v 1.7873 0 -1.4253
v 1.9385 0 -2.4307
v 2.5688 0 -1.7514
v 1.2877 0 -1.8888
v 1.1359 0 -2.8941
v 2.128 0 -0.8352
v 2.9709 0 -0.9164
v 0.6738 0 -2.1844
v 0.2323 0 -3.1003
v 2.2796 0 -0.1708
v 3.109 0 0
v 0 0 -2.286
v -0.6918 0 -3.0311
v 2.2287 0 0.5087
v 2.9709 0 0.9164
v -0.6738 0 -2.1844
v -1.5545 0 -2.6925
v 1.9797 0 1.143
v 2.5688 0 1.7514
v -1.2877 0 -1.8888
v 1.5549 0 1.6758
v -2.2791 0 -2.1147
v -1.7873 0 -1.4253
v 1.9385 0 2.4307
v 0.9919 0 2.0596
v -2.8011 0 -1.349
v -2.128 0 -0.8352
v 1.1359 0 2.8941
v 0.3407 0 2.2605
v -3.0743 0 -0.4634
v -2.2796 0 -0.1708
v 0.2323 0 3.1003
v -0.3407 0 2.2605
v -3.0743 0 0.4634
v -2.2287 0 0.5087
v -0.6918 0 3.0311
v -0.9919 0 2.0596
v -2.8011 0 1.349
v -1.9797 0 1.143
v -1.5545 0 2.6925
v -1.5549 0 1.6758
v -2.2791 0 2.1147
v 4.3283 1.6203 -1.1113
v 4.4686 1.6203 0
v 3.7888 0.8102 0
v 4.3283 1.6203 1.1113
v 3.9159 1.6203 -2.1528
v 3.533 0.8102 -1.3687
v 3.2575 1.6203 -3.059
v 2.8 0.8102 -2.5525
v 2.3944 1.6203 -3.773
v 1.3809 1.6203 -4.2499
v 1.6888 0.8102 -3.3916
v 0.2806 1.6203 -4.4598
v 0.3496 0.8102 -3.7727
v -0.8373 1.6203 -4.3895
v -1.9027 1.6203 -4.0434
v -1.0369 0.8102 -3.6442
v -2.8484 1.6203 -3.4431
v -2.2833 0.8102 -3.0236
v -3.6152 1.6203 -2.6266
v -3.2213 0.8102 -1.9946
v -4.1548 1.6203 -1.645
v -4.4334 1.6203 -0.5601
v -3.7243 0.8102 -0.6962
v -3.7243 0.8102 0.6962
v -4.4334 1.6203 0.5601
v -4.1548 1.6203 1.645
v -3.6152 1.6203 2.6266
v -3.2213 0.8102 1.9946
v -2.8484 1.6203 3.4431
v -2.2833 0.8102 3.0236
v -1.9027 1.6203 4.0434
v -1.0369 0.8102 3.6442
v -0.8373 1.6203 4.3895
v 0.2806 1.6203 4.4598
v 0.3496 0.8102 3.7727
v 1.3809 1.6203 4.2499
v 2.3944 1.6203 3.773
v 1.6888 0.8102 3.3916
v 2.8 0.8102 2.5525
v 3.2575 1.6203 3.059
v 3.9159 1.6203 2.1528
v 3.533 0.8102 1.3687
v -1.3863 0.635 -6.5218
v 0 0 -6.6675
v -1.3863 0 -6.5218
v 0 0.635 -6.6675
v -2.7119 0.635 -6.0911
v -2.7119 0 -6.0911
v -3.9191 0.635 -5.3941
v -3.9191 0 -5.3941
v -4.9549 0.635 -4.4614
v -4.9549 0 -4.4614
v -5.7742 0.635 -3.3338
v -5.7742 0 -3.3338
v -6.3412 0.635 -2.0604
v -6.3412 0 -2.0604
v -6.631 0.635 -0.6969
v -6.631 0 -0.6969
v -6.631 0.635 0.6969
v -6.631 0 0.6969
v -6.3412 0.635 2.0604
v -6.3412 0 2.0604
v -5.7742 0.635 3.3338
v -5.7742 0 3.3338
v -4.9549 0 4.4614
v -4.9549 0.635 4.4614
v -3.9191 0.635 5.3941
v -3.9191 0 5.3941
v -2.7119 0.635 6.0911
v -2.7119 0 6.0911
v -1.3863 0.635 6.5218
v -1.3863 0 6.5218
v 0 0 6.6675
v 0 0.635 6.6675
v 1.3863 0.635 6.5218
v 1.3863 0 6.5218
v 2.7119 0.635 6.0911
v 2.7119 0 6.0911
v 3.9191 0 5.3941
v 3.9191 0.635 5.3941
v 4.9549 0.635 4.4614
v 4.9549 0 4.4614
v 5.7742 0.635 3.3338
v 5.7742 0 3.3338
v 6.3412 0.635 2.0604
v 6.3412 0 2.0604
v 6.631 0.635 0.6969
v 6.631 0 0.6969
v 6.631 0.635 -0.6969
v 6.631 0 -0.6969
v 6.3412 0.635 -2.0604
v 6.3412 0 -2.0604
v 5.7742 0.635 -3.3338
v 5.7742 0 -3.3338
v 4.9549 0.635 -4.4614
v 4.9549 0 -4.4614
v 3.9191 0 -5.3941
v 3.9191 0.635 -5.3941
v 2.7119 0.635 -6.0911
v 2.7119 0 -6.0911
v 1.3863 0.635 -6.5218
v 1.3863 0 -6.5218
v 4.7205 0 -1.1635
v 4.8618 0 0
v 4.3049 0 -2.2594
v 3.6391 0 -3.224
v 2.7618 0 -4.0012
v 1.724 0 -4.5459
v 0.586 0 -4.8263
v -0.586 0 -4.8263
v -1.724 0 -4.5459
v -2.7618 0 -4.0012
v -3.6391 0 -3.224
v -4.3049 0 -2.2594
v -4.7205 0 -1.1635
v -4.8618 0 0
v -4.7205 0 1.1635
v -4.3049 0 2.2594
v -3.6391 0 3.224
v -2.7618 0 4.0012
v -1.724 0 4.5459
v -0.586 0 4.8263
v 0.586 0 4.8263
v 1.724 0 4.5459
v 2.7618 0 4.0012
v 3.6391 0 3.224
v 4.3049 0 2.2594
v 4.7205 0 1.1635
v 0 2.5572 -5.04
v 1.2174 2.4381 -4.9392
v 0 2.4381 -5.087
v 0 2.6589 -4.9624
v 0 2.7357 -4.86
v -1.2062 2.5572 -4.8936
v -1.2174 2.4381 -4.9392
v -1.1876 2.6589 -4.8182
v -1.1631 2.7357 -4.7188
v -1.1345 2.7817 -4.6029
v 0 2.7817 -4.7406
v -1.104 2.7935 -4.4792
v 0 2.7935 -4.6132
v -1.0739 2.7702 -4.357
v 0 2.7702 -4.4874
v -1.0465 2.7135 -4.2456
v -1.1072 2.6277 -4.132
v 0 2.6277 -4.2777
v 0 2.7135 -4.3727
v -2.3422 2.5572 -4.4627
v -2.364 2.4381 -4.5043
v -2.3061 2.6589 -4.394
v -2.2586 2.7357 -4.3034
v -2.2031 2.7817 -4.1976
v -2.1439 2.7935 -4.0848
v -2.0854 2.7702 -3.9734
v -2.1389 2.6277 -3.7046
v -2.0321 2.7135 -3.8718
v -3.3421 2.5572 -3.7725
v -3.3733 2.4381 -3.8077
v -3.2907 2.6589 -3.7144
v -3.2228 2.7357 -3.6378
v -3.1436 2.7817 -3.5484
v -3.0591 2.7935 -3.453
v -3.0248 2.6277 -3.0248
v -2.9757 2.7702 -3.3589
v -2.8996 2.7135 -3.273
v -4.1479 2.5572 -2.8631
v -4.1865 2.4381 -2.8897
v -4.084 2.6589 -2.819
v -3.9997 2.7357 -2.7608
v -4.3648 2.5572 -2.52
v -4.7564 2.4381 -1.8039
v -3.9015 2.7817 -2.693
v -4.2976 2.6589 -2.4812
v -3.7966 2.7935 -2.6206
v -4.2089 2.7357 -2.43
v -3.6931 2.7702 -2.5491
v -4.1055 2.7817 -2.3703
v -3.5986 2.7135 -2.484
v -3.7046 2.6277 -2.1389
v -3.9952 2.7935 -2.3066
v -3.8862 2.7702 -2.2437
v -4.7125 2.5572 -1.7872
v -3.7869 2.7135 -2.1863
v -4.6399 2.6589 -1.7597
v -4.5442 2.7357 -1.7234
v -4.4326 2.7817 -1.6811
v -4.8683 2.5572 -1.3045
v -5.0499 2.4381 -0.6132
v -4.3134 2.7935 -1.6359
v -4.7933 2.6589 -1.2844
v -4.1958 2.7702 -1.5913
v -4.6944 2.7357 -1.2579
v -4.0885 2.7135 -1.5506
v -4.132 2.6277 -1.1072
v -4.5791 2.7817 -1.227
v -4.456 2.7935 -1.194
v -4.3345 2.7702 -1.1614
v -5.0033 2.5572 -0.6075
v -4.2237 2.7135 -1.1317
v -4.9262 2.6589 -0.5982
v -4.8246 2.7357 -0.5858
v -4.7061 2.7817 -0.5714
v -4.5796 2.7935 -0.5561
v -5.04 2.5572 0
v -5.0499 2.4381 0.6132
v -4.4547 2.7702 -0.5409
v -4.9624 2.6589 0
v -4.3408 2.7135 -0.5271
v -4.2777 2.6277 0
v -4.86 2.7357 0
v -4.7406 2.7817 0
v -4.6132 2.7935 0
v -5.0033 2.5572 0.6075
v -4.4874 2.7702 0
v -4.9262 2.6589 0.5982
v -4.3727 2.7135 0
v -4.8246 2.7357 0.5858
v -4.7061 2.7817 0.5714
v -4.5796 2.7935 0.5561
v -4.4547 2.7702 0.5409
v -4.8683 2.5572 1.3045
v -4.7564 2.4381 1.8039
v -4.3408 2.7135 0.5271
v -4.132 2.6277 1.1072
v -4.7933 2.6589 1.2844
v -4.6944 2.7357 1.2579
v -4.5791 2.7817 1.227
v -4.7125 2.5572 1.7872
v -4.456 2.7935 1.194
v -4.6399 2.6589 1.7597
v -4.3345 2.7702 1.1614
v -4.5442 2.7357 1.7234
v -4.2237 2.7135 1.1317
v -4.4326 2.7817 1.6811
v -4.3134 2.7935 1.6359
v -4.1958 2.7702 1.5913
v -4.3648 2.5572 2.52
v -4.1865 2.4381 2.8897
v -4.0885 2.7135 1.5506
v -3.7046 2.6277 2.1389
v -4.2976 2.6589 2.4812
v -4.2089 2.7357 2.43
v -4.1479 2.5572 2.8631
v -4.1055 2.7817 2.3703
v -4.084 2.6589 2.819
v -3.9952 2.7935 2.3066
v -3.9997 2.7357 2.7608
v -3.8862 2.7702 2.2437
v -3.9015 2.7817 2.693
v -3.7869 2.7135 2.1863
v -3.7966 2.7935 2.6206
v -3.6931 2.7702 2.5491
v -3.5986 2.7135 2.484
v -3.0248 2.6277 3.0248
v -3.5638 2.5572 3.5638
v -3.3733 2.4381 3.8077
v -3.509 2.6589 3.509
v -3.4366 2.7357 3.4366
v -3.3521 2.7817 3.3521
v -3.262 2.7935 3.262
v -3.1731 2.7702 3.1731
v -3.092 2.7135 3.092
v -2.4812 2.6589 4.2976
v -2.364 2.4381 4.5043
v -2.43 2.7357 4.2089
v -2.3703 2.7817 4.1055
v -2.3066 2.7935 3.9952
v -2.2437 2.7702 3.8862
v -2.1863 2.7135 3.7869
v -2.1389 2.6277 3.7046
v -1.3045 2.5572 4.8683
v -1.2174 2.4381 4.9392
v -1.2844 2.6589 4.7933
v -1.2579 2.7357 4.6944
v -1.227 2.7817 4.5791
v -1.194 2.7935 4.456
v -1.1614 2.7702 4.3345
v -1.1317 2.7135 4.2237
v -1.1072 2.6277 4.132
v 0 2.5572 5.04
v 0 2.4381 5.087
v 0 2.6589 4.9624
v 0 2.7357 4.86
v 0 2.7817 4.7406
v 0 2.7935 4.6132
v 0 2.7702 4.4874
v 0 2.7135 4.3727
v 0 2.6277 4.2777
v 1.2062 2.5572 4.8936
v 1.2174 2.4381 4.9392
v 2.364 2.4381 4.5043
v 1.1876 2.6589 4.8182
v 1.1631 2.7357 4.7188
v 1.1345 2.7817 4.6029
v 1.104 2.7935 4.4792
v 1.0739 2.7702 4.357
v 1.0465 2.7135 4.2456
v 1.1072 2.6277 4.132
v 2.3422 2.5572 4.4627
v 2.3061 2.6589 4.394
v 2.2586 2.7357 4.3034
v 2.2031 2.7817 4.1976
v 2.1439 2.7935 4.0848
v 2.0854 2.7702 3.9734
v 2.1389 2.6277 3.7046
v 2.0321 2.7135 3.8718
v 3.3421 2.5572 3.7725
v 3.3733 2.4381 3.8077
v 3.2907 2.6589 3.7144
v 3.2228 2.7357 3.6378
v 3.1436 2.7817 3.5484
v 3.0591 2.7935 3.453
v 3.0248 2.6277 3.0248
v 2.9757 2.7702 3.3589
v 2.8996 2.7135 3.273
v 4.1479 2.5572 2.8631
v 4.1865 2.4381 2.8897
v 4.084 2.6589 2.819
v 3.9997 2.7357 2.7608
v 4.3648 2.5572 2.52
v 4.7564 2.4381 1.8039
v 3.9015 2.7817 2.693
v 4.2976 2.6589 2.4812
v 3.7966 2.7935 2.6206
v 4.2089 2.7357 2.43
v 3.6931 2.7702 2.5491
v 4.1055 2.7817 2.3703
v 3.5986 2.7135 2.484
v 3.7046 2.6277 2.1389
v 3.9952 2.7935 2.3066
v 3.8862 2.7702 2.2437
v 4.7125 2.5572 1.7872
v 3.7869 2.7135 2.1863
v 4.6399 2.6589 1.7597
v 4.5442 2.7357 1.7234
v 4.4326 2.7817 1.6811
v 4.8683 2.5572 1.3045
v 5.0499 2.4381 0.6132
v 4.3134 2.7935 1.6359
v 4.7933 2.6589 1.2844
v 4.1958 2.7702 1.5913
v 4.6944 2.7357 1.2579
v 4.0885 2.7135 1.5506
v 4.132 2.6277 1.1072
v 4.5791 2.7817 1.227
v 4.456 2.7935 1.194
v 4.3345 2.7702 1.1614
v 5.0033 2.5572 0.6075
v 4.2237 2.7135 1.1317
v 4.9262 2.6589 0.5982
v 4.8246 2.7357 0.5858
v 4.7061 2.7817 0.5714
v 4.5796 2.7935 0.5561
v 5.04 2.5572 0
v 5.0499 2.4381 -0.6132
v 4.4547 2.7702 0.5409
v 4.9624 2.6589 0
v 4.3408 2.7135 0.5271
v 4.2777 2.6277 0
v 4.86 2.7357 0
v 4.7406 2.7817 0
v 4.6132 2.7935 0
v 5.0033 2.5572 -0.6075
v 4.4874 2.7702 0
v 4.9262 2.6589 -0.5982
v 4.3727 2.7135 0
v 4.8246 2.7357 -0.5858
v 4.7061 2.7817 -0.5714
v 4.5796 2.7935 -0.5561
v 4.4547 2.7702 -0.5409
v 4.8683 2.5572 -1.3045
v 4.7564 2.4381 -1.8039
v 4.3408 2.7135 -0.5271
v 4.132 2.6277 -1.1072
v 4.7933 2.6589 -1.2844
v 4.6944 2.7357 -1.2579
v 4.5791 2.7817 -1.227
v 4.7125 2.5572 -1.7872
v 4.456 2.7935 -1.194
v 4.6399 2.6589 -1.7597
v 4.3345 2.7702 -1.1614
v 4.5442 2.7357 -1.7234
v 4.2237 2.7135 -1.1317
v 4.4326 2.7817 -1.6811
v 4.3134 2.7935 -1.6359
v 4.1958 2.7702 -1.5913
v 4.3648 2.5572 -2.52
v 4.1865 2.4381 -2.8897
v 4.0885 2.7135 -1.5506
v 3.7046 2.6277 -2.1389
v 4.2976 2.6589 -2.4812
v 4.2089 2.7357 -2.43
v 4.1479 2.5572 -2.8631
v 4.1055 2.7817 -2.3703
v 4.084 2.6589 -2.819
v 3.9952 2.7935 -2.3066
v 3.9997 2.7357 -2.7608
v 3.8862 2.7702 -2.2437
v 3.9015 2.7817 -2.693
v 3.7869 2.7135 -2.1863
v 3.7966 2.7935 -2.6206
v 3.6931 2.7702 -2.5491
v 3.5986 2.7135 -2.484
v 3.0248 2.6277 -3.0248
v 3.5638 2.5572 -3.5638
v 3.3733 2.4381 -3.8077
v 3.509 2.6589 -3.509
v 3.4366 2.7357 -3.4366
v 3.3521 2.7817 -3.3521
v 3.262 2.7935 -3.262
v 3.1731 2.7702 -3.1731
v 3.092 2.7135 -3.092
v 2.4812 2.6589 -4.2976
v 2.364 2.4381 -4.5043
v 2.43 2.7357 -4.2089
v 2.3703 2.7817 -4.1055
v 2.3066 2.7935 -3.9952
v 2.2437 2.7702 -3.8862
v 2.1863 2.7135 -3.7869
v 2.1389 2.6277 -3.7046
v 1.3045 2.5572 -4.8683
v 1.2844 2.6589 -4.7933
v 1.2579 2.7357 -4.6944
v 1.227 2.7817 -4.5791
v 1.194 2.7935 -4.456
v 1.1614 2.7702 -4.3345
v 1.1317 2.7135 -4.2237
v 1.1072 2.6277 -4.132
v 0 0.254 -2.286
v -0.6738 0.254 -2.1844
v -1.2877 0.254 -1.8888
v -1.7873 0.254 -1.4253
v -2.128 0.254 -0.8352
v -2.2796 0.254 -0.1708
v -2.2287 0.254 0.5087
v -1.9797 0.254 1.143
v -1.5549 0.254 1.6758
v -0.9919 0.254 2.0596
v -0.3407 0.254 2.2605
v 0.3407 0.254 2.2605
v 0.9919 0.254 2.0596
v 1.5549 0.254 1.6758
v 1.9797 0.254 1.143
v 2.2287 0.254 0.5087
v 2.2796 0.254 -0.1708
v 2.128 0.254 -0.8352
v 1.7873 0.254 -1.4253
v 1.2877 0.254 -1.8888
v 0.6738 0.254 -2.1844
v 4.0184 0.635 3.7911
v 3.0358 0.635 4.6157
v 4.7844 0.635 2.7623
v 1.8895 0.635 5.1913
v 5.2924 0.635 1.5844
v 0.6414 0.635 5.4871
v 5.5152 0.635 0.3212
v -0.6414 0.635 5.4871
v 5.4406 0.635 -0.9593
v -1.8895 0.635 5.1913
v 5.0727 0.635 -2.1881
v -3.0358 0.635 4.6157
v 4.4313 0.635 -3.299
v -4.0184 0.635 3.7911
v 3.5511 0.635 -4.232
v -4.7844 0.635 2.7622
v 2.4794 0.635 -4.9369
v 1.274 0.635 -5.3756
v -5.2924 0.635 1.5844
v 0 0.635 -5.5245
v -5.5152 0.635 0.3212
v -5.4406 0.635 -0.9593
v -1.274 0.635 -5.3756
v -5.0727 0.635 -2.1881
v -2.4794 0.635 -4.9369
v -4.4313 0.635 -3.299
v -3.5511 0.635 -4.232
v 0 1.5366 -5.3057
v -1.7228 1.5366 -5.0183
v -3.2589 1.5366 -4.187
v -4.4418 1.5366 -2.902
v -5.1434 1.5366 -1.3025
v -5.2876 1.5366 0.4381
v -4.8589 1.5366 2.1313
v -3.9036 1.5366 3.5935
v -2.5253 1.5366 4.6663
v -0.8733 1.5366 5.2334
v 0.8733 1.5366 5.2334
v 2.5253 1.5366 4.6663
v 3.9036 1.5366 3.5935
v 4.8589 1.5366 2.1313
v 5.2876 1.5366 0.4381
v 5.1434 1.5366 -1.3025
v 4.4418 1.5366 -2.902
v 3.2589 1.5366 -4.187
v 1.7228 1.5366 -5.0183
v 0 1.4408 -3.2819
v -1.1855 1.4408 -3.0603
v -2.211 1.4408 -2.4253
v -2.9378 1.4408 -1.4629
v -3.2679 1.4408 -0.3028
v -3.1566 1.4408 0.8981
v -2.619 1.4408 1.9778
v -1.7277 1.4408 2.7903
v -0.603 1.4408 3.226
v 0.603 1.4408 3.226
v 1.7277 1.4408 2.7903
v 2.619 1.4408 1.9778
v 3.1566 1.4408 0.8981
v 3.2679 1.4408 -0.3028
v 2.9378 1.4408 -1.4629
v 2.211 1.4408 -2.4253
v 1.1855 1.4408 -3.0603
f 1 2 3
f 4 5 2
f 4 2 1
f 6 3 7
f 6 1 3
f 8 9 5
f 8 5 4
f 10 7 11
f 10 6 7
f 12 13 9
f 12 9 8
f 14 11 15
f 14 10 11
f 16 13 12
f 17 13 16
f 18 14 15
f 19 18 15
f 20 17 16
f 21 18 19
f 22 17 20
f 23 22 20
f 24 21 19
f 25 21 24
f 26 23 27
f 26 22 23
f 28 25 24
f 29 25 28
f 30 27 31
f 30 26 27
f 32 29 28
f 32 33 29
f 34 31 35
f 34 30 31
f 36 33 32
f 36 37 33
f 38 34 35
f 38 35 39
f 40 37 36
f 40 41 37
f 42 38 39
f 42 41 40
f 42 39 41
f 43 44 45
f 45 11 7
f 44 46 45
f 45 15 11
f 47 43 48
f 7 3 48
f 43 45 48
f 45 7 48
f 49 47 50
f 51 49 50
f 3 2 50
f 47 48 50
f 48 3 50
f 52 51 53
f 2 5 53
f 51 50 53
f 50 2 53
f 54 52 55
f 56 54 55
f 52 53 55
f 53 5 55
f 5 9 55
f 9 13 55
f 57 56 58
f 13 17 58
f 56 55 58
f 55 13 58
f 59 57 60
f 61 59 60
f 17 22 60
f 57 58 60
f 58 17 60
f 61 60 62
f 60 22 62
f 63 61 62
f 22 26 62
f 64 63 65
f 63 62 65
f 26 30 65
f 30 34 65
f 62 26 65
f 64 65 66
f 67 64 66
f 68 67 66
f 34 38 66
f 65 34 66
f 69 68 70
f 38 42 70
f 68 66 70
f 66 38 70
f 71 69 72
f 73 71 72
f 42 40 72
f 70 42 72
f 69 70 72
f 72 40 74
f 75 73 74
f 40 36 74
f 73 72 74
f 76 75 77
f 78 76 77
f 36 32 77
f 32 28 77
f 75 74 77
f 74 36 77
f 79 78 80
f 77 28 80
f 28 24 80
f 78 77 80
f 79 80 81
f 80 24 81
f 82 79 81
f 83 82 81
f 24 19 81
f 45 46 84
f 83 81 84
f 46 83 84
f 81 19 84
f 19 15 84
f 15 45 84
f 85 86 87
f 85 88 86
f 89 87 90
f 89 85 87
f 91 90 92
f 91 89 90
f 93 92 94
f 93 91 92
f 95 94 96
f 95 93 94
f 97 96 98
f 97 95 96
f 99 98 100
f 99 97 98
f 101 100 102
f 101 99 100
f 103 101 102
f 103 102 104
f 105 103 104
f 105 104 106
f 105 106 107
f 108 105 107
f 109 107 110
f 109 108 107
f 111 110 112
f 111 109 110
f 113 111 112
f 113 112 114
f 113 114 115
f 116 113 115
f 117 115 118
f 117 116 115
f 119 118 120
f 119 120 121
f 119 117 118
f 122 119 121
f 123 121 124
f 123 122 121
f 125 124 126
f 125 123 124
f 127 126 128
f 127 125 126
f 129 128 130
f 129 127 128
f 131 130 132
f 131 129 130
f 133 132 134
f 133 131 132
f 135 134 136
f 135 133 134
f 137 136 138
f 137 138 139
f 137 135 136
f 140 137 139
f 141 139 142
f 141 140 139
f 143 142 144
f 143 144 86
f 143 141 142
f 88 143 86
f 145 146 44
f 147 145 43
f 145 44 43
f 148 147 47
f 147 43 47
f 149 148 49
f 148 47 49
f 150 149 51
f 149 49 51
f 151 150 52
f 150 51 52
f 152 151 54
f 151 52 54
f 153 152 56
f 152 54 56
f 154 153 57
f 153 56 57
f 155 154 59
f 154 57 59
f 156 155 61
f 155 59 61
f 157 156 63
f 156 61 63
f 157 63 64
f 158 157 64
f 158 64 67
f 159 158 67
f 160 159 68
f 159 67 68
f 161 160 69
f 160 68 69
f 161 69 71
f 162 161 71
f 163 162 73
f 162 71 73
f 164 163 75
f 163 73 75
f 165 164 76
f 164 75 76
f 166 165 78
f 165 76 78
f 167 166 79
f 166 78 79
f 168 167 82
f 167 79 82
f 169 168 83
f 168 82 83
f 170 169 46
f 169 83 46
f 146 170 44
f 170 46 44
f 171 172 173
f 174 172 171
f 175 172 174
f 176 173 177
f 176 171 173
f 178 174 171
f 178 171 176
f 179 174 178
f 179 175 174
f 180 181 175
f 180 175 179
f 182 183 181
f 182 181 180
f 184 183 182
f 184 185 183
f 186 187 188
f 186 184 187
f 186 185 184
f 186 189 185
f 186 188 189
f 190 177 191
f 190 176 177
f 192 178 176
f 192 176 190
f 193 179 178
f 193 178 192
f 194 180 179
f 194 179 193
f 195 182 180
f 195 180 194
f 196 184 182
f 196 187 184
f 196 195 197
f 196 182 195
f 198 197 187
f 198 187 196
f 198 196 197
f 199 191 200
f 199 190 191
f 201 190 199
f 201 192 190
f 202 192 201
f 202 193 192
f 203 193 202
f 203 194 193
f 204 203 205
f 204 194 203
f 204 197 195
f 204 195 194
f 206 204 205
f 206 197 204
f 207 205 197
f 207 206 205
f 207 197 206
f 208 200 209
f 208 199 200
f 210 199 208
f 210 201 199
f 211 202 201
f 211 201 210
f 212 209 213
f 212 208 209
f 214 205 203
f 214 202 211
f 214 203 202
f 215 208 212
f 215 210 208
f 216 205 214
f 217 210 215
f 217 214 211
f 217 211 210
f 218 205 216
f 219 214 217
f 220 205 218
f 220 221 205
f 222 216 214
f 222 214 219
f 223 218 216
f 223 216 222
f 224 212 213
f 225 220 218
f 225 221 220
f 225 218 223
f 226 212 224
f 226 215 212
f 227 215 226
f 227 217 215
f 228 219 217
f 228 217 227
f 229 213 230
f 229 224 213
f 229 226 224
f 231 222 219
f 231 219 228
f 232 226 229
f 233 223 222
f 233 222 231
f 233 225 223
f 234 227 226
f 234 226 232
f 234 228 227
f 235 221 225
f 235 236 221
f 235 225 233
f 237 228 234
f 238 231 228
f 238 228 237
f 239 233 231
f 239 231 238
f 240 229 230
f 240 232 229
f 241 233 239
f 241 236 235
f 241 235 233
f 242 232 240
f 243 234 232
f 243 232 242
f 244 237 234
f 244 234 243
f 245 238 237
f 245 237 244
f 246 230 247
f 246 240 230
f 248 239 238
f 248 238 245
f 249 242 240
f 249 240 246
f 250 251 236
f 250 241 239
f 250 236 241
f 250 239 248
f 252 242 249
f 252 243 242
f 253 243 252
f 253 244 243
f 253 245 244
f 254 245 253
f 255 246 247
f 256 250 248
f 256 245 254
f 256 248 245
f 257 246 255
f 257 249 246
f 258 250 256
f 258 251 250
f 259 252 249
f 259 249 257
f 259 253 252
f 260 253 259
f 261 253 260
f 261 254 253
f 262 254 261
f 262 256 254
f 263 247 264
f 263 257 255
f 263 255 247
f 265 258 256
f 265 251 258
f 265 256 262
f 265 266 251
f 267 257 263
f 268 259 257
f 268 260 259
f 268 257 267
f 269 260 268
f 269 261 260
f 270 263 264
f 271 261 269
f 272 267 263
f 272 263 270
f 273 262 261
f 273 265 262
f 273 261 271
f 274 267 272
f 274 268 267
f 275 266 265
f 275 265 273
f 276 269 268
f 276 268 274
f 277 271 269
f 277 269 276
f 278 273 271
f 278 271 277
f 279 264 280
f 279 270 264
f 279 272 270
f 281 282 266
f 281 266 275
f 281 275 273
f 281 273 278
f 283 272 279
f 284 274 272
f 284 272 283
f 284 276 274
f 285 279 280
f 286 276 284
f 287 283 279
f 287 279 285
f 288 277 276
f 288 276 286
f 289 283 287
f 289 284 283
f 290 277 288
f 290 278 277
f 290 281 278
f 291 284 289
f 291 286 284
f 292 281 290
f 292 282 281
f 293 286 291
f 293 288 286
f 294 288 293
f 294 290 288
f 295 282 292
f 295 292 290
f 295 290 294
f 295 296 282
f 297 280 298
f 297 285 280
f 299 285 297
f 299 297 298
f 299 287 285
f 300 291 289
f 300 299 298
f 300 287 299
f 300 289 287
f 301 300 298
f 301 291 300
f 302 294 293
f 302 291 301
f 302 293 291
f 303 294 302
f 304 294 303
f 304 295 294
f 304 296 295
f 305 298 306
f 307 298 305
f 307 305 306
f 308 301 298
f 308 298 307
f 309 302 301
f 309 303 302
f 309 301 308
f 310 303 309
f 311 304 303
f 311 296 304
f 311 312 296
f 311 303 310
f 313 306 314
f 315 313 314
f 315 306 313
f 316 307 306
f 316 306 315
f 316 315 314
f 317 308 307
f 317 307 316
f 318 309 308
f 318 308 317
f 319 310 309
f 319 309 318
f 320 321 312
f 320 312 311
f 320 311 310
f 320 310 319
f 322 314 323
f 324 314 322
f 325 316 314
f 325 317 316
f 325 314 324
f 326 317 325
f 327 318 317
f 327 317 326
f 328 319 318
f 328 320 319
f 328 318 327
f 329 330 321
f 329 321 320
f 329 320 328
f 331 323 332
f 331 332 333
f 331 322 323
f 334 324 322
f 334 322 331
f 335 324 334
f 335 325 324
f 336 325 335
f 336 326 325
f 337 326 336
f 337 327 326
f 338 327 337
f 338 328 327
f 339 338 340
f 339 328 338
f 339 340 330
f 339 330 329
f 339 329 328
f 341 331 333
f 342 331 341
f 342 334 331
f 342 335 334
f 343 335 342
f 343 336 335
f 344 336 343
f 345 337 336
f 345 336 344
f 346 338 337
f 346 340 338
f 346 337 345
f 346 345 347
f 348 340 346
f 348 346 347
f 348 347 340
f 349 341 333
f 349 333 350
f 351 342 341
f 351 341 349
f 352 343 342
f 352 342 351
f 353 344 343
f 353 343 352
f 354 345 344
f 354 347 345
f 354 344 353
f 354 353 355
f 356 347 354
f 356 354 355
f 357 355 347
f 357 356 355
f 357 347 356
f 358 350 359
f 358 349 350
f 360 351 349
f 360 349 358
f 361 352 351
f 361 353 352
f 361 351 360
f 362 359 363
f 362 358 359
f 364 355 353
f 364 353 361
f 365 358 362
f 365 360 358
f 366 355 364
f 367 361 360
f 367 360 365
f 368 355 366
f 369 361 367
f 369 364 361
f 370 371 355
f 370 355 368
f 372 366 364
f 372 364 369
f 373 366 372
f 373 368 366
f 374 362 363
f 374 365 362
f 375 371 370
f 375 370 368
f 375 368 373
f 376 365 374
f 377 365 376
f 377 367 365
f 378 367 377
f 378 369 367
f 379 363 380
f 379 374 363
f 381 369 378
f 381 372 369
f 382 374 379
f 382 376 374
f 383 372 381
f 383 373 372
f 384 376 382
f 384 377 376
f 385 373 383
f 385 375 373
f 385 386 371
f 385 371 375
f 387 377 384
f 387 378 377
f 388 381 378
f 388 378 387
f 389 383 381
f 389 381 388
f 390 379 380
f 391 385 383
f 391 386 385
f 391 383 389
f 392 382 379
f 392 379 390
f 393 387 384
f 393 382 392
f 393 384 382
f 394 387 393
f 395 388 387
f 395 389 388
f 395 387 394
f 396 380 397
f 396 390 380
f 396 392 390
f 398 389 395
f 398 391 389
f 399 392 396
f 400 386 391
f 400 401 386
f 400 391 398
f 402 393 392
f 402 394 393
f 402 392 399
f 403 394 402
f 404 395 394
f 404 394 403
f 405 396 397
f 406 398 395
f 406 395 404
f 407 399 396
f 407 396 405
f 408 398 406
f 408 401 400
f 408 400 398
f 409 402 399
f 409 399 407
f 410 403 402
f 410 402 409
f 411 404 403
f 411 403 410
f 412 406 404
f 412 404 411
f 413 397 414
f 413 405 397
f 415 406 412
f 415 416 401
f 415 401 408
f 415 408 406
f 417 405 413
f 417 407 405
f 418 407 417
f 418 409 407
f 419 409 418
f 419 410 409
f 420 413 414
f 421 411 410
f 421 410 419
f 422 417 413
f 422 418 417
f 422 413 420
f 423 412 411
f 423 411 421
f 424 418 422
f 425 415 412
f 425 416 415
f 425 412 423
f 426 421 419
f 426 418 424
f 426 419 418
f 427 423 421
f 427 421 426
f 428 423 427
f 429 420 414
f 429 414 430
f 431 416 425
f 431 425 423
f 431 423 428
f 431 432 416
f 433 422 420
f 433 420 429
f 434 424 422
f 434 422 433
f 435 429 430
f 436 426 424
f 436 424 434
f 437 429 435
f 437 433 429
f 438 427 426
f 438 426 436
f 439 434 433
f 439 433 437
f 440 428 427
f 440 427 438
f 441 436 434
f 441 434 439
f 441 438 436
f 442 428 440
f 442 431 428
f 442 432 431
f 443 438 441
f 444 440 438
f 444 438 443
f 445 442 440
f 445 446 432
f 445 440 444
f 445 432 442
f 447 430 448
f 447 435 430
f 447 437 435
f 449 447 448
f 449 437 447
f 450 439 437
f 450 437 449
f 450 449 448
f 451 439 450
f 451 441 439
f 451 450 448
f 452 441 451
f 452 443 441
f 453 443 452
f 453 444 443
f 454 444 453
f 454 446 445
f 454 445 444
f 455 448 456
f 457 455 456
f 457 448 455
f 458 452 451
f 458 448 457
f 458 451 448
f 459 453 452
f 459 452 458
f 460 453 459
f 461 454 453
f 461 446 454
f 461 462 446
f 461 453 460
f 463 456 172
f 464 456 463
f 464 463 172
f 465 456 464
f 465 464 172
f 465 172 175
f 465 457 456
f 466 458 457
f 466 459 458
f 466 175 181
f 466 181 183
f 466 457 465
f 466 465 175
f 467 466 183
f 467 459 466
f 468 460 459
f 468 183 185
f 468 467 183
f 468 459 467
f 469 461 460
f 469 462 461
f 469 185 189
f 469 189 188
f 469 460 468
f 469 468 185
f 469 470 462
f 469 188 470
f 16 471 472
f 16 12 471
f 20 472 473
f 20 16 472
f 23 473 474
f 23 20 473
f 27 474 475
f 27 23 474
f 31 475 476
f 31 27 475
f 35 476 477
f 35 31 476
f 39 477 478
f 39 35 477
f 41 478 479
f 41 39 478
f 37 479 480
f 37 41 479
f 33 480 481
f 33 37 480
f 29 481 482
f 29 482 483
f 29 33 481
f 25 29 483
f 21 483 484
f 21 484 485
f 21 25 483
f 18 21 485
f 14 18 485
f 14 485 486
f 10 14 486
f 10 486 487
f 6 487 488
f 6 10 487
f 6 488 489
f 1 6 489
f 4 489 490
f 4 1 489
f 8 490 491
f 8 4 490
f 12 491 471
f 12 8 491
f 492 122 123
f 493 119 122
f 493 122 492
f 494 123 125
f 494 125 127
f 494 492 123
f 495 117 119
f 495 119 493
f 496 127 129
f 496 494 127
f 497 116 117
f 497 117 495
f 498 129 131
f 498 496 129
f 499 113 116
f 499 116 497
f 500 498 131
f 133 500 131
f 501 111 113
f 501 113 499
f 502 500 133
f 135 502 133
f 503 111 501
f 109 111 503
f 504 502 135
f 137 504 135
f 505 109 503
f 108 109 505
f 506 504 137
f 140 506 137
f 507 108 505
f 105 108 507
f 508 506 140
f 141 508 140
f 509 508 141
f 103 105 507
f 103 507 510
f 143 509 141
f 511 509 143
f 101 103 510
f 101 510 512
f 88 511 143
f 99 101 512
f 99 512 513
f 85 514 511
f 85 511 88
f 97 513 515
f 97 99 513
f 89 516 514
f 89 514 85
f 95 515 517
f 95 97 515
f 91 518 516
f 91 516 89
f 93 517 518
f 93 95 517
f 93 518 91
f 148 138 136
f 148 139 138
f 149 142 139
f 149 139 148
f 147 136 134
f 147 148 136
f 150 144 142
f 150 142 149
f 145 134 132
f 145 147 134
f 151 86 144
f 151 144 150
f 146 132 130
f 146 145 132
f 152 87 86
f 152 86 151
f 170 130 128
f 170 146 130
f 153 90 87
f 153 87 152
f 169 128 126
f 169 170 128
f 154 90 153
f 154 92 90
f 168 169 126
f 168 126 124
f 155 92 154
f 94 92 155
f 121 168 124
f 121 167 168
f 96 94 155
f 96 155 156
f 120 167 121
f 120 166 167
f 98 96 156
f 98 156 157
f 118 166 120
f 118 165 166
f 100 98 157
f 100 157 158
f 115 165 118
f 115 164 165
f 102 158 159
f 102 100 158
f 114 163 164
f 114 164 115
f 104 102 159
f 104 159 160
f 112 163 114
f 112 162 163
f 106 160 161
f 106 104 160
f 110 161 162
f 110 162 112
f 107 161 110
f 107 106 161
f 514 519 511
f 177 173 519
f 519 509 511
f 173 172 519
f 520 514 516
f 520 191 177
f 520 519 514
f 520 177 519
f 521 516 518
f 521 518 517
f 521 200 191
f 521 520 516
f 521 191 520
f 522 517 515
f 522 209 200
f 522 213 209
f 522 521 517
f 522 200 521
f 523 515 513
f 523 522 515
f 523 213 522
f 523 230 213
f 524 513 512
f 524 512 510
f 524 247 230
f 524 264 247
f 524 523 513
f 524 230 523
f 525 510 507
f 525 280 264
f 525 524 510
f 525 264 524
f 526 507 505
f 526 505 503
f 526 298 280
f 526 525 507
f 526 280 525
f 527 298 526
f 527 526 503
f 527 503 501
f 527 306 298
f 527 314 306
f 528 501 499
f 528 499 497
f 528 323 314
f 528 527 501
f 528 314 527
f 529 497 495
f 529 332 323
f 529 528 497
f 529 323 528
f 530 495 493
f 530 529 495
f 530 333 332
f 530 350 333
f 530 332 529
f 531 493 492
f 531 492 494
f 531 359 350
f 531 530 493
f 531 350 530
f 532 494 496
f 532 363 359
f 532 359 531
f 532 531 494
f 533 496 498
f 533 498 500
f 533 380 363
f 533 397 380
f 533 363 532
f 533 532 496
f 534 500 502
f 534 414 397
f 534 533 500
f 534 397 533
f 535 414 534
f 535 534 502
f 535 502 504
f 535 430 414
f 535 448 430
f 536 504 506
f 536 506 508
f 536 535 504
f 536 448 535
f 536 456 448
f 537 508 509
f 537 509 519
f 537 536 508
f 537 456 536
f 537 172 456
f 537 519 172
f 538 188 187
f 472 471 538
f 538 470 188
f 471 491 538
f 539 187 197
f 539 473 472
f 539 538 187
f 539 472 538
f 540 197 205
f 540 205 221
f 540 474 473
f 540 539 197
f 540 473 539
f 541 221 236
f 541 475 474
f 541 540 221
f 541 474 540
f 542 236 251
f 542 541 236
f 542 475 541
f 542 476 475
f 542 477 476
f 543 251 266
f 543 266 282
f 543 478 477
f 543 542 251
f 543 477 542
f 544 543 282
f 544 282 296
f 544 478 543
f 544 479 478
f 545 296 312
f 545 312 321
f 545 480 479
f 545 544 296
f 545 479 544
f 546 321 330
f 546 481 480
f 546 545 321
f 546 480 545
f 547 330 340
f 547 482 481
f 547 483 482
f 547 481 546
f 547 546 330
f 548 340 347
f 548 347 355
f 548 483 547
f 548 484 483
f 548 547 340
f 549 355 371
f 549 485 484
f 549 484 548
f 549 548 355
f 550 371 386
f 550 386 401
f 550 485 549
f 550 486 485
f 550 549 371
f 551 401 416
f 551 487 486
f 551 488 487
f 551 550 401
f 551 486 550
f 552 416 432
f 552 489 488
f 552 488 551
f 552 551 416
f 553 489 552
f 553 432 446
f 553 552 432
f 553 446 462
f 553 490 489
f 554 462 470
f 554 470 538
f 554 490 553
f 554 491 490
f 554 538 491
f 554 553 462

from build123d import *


# Read off the part's stored shape, not the designer's step: Shell2
with BuildPart() as part:
    # Sketch1 → Revolve1 (revolve)
    with BuildSketch(Plane.XY, mode=Mode.PRIVATE) as revolve1_sk:
        with BuildLine():
            Line((-6.6675, 0), (-6.6675, 0.635))
            Line((-6.6675, 0.635), (-5.5245, 0.635))
            Line((-5.5245, 0.635), (-5.086993169, 2.438135229))
            ThreePointArc((-5.086993169, 2.438135229), (-4.740640087, 2.78173227), (-4.277735634, 2.627658097))
            Line((-4.277735634, 2.627658097), (-2.286, 0.254))
            Line((-2.286, 0.254), (-2.286, 0))
            Line((-2.286, 0), (-6.6675, 0))
        make_face()
    revolve(revolve1_sk.sketch.rotate(Axis((0, 0, 0), (0, 1, 0)), 270), axis=Axis((0, 0, 0), (0, 1, 0)))

    # Shell2 outline → Shell2 (revolve, cut)
    with BuildSketch(Plane.XY):
        Polygon((4.861793391, 0), (4.468644562, 1.620318711), (3.10903573, 0), align=None)
    revolve(axis=Axis((0, 0, 0), (0, 1, 0)), mode=Mode.SUBTRACT)


solid = part.part
